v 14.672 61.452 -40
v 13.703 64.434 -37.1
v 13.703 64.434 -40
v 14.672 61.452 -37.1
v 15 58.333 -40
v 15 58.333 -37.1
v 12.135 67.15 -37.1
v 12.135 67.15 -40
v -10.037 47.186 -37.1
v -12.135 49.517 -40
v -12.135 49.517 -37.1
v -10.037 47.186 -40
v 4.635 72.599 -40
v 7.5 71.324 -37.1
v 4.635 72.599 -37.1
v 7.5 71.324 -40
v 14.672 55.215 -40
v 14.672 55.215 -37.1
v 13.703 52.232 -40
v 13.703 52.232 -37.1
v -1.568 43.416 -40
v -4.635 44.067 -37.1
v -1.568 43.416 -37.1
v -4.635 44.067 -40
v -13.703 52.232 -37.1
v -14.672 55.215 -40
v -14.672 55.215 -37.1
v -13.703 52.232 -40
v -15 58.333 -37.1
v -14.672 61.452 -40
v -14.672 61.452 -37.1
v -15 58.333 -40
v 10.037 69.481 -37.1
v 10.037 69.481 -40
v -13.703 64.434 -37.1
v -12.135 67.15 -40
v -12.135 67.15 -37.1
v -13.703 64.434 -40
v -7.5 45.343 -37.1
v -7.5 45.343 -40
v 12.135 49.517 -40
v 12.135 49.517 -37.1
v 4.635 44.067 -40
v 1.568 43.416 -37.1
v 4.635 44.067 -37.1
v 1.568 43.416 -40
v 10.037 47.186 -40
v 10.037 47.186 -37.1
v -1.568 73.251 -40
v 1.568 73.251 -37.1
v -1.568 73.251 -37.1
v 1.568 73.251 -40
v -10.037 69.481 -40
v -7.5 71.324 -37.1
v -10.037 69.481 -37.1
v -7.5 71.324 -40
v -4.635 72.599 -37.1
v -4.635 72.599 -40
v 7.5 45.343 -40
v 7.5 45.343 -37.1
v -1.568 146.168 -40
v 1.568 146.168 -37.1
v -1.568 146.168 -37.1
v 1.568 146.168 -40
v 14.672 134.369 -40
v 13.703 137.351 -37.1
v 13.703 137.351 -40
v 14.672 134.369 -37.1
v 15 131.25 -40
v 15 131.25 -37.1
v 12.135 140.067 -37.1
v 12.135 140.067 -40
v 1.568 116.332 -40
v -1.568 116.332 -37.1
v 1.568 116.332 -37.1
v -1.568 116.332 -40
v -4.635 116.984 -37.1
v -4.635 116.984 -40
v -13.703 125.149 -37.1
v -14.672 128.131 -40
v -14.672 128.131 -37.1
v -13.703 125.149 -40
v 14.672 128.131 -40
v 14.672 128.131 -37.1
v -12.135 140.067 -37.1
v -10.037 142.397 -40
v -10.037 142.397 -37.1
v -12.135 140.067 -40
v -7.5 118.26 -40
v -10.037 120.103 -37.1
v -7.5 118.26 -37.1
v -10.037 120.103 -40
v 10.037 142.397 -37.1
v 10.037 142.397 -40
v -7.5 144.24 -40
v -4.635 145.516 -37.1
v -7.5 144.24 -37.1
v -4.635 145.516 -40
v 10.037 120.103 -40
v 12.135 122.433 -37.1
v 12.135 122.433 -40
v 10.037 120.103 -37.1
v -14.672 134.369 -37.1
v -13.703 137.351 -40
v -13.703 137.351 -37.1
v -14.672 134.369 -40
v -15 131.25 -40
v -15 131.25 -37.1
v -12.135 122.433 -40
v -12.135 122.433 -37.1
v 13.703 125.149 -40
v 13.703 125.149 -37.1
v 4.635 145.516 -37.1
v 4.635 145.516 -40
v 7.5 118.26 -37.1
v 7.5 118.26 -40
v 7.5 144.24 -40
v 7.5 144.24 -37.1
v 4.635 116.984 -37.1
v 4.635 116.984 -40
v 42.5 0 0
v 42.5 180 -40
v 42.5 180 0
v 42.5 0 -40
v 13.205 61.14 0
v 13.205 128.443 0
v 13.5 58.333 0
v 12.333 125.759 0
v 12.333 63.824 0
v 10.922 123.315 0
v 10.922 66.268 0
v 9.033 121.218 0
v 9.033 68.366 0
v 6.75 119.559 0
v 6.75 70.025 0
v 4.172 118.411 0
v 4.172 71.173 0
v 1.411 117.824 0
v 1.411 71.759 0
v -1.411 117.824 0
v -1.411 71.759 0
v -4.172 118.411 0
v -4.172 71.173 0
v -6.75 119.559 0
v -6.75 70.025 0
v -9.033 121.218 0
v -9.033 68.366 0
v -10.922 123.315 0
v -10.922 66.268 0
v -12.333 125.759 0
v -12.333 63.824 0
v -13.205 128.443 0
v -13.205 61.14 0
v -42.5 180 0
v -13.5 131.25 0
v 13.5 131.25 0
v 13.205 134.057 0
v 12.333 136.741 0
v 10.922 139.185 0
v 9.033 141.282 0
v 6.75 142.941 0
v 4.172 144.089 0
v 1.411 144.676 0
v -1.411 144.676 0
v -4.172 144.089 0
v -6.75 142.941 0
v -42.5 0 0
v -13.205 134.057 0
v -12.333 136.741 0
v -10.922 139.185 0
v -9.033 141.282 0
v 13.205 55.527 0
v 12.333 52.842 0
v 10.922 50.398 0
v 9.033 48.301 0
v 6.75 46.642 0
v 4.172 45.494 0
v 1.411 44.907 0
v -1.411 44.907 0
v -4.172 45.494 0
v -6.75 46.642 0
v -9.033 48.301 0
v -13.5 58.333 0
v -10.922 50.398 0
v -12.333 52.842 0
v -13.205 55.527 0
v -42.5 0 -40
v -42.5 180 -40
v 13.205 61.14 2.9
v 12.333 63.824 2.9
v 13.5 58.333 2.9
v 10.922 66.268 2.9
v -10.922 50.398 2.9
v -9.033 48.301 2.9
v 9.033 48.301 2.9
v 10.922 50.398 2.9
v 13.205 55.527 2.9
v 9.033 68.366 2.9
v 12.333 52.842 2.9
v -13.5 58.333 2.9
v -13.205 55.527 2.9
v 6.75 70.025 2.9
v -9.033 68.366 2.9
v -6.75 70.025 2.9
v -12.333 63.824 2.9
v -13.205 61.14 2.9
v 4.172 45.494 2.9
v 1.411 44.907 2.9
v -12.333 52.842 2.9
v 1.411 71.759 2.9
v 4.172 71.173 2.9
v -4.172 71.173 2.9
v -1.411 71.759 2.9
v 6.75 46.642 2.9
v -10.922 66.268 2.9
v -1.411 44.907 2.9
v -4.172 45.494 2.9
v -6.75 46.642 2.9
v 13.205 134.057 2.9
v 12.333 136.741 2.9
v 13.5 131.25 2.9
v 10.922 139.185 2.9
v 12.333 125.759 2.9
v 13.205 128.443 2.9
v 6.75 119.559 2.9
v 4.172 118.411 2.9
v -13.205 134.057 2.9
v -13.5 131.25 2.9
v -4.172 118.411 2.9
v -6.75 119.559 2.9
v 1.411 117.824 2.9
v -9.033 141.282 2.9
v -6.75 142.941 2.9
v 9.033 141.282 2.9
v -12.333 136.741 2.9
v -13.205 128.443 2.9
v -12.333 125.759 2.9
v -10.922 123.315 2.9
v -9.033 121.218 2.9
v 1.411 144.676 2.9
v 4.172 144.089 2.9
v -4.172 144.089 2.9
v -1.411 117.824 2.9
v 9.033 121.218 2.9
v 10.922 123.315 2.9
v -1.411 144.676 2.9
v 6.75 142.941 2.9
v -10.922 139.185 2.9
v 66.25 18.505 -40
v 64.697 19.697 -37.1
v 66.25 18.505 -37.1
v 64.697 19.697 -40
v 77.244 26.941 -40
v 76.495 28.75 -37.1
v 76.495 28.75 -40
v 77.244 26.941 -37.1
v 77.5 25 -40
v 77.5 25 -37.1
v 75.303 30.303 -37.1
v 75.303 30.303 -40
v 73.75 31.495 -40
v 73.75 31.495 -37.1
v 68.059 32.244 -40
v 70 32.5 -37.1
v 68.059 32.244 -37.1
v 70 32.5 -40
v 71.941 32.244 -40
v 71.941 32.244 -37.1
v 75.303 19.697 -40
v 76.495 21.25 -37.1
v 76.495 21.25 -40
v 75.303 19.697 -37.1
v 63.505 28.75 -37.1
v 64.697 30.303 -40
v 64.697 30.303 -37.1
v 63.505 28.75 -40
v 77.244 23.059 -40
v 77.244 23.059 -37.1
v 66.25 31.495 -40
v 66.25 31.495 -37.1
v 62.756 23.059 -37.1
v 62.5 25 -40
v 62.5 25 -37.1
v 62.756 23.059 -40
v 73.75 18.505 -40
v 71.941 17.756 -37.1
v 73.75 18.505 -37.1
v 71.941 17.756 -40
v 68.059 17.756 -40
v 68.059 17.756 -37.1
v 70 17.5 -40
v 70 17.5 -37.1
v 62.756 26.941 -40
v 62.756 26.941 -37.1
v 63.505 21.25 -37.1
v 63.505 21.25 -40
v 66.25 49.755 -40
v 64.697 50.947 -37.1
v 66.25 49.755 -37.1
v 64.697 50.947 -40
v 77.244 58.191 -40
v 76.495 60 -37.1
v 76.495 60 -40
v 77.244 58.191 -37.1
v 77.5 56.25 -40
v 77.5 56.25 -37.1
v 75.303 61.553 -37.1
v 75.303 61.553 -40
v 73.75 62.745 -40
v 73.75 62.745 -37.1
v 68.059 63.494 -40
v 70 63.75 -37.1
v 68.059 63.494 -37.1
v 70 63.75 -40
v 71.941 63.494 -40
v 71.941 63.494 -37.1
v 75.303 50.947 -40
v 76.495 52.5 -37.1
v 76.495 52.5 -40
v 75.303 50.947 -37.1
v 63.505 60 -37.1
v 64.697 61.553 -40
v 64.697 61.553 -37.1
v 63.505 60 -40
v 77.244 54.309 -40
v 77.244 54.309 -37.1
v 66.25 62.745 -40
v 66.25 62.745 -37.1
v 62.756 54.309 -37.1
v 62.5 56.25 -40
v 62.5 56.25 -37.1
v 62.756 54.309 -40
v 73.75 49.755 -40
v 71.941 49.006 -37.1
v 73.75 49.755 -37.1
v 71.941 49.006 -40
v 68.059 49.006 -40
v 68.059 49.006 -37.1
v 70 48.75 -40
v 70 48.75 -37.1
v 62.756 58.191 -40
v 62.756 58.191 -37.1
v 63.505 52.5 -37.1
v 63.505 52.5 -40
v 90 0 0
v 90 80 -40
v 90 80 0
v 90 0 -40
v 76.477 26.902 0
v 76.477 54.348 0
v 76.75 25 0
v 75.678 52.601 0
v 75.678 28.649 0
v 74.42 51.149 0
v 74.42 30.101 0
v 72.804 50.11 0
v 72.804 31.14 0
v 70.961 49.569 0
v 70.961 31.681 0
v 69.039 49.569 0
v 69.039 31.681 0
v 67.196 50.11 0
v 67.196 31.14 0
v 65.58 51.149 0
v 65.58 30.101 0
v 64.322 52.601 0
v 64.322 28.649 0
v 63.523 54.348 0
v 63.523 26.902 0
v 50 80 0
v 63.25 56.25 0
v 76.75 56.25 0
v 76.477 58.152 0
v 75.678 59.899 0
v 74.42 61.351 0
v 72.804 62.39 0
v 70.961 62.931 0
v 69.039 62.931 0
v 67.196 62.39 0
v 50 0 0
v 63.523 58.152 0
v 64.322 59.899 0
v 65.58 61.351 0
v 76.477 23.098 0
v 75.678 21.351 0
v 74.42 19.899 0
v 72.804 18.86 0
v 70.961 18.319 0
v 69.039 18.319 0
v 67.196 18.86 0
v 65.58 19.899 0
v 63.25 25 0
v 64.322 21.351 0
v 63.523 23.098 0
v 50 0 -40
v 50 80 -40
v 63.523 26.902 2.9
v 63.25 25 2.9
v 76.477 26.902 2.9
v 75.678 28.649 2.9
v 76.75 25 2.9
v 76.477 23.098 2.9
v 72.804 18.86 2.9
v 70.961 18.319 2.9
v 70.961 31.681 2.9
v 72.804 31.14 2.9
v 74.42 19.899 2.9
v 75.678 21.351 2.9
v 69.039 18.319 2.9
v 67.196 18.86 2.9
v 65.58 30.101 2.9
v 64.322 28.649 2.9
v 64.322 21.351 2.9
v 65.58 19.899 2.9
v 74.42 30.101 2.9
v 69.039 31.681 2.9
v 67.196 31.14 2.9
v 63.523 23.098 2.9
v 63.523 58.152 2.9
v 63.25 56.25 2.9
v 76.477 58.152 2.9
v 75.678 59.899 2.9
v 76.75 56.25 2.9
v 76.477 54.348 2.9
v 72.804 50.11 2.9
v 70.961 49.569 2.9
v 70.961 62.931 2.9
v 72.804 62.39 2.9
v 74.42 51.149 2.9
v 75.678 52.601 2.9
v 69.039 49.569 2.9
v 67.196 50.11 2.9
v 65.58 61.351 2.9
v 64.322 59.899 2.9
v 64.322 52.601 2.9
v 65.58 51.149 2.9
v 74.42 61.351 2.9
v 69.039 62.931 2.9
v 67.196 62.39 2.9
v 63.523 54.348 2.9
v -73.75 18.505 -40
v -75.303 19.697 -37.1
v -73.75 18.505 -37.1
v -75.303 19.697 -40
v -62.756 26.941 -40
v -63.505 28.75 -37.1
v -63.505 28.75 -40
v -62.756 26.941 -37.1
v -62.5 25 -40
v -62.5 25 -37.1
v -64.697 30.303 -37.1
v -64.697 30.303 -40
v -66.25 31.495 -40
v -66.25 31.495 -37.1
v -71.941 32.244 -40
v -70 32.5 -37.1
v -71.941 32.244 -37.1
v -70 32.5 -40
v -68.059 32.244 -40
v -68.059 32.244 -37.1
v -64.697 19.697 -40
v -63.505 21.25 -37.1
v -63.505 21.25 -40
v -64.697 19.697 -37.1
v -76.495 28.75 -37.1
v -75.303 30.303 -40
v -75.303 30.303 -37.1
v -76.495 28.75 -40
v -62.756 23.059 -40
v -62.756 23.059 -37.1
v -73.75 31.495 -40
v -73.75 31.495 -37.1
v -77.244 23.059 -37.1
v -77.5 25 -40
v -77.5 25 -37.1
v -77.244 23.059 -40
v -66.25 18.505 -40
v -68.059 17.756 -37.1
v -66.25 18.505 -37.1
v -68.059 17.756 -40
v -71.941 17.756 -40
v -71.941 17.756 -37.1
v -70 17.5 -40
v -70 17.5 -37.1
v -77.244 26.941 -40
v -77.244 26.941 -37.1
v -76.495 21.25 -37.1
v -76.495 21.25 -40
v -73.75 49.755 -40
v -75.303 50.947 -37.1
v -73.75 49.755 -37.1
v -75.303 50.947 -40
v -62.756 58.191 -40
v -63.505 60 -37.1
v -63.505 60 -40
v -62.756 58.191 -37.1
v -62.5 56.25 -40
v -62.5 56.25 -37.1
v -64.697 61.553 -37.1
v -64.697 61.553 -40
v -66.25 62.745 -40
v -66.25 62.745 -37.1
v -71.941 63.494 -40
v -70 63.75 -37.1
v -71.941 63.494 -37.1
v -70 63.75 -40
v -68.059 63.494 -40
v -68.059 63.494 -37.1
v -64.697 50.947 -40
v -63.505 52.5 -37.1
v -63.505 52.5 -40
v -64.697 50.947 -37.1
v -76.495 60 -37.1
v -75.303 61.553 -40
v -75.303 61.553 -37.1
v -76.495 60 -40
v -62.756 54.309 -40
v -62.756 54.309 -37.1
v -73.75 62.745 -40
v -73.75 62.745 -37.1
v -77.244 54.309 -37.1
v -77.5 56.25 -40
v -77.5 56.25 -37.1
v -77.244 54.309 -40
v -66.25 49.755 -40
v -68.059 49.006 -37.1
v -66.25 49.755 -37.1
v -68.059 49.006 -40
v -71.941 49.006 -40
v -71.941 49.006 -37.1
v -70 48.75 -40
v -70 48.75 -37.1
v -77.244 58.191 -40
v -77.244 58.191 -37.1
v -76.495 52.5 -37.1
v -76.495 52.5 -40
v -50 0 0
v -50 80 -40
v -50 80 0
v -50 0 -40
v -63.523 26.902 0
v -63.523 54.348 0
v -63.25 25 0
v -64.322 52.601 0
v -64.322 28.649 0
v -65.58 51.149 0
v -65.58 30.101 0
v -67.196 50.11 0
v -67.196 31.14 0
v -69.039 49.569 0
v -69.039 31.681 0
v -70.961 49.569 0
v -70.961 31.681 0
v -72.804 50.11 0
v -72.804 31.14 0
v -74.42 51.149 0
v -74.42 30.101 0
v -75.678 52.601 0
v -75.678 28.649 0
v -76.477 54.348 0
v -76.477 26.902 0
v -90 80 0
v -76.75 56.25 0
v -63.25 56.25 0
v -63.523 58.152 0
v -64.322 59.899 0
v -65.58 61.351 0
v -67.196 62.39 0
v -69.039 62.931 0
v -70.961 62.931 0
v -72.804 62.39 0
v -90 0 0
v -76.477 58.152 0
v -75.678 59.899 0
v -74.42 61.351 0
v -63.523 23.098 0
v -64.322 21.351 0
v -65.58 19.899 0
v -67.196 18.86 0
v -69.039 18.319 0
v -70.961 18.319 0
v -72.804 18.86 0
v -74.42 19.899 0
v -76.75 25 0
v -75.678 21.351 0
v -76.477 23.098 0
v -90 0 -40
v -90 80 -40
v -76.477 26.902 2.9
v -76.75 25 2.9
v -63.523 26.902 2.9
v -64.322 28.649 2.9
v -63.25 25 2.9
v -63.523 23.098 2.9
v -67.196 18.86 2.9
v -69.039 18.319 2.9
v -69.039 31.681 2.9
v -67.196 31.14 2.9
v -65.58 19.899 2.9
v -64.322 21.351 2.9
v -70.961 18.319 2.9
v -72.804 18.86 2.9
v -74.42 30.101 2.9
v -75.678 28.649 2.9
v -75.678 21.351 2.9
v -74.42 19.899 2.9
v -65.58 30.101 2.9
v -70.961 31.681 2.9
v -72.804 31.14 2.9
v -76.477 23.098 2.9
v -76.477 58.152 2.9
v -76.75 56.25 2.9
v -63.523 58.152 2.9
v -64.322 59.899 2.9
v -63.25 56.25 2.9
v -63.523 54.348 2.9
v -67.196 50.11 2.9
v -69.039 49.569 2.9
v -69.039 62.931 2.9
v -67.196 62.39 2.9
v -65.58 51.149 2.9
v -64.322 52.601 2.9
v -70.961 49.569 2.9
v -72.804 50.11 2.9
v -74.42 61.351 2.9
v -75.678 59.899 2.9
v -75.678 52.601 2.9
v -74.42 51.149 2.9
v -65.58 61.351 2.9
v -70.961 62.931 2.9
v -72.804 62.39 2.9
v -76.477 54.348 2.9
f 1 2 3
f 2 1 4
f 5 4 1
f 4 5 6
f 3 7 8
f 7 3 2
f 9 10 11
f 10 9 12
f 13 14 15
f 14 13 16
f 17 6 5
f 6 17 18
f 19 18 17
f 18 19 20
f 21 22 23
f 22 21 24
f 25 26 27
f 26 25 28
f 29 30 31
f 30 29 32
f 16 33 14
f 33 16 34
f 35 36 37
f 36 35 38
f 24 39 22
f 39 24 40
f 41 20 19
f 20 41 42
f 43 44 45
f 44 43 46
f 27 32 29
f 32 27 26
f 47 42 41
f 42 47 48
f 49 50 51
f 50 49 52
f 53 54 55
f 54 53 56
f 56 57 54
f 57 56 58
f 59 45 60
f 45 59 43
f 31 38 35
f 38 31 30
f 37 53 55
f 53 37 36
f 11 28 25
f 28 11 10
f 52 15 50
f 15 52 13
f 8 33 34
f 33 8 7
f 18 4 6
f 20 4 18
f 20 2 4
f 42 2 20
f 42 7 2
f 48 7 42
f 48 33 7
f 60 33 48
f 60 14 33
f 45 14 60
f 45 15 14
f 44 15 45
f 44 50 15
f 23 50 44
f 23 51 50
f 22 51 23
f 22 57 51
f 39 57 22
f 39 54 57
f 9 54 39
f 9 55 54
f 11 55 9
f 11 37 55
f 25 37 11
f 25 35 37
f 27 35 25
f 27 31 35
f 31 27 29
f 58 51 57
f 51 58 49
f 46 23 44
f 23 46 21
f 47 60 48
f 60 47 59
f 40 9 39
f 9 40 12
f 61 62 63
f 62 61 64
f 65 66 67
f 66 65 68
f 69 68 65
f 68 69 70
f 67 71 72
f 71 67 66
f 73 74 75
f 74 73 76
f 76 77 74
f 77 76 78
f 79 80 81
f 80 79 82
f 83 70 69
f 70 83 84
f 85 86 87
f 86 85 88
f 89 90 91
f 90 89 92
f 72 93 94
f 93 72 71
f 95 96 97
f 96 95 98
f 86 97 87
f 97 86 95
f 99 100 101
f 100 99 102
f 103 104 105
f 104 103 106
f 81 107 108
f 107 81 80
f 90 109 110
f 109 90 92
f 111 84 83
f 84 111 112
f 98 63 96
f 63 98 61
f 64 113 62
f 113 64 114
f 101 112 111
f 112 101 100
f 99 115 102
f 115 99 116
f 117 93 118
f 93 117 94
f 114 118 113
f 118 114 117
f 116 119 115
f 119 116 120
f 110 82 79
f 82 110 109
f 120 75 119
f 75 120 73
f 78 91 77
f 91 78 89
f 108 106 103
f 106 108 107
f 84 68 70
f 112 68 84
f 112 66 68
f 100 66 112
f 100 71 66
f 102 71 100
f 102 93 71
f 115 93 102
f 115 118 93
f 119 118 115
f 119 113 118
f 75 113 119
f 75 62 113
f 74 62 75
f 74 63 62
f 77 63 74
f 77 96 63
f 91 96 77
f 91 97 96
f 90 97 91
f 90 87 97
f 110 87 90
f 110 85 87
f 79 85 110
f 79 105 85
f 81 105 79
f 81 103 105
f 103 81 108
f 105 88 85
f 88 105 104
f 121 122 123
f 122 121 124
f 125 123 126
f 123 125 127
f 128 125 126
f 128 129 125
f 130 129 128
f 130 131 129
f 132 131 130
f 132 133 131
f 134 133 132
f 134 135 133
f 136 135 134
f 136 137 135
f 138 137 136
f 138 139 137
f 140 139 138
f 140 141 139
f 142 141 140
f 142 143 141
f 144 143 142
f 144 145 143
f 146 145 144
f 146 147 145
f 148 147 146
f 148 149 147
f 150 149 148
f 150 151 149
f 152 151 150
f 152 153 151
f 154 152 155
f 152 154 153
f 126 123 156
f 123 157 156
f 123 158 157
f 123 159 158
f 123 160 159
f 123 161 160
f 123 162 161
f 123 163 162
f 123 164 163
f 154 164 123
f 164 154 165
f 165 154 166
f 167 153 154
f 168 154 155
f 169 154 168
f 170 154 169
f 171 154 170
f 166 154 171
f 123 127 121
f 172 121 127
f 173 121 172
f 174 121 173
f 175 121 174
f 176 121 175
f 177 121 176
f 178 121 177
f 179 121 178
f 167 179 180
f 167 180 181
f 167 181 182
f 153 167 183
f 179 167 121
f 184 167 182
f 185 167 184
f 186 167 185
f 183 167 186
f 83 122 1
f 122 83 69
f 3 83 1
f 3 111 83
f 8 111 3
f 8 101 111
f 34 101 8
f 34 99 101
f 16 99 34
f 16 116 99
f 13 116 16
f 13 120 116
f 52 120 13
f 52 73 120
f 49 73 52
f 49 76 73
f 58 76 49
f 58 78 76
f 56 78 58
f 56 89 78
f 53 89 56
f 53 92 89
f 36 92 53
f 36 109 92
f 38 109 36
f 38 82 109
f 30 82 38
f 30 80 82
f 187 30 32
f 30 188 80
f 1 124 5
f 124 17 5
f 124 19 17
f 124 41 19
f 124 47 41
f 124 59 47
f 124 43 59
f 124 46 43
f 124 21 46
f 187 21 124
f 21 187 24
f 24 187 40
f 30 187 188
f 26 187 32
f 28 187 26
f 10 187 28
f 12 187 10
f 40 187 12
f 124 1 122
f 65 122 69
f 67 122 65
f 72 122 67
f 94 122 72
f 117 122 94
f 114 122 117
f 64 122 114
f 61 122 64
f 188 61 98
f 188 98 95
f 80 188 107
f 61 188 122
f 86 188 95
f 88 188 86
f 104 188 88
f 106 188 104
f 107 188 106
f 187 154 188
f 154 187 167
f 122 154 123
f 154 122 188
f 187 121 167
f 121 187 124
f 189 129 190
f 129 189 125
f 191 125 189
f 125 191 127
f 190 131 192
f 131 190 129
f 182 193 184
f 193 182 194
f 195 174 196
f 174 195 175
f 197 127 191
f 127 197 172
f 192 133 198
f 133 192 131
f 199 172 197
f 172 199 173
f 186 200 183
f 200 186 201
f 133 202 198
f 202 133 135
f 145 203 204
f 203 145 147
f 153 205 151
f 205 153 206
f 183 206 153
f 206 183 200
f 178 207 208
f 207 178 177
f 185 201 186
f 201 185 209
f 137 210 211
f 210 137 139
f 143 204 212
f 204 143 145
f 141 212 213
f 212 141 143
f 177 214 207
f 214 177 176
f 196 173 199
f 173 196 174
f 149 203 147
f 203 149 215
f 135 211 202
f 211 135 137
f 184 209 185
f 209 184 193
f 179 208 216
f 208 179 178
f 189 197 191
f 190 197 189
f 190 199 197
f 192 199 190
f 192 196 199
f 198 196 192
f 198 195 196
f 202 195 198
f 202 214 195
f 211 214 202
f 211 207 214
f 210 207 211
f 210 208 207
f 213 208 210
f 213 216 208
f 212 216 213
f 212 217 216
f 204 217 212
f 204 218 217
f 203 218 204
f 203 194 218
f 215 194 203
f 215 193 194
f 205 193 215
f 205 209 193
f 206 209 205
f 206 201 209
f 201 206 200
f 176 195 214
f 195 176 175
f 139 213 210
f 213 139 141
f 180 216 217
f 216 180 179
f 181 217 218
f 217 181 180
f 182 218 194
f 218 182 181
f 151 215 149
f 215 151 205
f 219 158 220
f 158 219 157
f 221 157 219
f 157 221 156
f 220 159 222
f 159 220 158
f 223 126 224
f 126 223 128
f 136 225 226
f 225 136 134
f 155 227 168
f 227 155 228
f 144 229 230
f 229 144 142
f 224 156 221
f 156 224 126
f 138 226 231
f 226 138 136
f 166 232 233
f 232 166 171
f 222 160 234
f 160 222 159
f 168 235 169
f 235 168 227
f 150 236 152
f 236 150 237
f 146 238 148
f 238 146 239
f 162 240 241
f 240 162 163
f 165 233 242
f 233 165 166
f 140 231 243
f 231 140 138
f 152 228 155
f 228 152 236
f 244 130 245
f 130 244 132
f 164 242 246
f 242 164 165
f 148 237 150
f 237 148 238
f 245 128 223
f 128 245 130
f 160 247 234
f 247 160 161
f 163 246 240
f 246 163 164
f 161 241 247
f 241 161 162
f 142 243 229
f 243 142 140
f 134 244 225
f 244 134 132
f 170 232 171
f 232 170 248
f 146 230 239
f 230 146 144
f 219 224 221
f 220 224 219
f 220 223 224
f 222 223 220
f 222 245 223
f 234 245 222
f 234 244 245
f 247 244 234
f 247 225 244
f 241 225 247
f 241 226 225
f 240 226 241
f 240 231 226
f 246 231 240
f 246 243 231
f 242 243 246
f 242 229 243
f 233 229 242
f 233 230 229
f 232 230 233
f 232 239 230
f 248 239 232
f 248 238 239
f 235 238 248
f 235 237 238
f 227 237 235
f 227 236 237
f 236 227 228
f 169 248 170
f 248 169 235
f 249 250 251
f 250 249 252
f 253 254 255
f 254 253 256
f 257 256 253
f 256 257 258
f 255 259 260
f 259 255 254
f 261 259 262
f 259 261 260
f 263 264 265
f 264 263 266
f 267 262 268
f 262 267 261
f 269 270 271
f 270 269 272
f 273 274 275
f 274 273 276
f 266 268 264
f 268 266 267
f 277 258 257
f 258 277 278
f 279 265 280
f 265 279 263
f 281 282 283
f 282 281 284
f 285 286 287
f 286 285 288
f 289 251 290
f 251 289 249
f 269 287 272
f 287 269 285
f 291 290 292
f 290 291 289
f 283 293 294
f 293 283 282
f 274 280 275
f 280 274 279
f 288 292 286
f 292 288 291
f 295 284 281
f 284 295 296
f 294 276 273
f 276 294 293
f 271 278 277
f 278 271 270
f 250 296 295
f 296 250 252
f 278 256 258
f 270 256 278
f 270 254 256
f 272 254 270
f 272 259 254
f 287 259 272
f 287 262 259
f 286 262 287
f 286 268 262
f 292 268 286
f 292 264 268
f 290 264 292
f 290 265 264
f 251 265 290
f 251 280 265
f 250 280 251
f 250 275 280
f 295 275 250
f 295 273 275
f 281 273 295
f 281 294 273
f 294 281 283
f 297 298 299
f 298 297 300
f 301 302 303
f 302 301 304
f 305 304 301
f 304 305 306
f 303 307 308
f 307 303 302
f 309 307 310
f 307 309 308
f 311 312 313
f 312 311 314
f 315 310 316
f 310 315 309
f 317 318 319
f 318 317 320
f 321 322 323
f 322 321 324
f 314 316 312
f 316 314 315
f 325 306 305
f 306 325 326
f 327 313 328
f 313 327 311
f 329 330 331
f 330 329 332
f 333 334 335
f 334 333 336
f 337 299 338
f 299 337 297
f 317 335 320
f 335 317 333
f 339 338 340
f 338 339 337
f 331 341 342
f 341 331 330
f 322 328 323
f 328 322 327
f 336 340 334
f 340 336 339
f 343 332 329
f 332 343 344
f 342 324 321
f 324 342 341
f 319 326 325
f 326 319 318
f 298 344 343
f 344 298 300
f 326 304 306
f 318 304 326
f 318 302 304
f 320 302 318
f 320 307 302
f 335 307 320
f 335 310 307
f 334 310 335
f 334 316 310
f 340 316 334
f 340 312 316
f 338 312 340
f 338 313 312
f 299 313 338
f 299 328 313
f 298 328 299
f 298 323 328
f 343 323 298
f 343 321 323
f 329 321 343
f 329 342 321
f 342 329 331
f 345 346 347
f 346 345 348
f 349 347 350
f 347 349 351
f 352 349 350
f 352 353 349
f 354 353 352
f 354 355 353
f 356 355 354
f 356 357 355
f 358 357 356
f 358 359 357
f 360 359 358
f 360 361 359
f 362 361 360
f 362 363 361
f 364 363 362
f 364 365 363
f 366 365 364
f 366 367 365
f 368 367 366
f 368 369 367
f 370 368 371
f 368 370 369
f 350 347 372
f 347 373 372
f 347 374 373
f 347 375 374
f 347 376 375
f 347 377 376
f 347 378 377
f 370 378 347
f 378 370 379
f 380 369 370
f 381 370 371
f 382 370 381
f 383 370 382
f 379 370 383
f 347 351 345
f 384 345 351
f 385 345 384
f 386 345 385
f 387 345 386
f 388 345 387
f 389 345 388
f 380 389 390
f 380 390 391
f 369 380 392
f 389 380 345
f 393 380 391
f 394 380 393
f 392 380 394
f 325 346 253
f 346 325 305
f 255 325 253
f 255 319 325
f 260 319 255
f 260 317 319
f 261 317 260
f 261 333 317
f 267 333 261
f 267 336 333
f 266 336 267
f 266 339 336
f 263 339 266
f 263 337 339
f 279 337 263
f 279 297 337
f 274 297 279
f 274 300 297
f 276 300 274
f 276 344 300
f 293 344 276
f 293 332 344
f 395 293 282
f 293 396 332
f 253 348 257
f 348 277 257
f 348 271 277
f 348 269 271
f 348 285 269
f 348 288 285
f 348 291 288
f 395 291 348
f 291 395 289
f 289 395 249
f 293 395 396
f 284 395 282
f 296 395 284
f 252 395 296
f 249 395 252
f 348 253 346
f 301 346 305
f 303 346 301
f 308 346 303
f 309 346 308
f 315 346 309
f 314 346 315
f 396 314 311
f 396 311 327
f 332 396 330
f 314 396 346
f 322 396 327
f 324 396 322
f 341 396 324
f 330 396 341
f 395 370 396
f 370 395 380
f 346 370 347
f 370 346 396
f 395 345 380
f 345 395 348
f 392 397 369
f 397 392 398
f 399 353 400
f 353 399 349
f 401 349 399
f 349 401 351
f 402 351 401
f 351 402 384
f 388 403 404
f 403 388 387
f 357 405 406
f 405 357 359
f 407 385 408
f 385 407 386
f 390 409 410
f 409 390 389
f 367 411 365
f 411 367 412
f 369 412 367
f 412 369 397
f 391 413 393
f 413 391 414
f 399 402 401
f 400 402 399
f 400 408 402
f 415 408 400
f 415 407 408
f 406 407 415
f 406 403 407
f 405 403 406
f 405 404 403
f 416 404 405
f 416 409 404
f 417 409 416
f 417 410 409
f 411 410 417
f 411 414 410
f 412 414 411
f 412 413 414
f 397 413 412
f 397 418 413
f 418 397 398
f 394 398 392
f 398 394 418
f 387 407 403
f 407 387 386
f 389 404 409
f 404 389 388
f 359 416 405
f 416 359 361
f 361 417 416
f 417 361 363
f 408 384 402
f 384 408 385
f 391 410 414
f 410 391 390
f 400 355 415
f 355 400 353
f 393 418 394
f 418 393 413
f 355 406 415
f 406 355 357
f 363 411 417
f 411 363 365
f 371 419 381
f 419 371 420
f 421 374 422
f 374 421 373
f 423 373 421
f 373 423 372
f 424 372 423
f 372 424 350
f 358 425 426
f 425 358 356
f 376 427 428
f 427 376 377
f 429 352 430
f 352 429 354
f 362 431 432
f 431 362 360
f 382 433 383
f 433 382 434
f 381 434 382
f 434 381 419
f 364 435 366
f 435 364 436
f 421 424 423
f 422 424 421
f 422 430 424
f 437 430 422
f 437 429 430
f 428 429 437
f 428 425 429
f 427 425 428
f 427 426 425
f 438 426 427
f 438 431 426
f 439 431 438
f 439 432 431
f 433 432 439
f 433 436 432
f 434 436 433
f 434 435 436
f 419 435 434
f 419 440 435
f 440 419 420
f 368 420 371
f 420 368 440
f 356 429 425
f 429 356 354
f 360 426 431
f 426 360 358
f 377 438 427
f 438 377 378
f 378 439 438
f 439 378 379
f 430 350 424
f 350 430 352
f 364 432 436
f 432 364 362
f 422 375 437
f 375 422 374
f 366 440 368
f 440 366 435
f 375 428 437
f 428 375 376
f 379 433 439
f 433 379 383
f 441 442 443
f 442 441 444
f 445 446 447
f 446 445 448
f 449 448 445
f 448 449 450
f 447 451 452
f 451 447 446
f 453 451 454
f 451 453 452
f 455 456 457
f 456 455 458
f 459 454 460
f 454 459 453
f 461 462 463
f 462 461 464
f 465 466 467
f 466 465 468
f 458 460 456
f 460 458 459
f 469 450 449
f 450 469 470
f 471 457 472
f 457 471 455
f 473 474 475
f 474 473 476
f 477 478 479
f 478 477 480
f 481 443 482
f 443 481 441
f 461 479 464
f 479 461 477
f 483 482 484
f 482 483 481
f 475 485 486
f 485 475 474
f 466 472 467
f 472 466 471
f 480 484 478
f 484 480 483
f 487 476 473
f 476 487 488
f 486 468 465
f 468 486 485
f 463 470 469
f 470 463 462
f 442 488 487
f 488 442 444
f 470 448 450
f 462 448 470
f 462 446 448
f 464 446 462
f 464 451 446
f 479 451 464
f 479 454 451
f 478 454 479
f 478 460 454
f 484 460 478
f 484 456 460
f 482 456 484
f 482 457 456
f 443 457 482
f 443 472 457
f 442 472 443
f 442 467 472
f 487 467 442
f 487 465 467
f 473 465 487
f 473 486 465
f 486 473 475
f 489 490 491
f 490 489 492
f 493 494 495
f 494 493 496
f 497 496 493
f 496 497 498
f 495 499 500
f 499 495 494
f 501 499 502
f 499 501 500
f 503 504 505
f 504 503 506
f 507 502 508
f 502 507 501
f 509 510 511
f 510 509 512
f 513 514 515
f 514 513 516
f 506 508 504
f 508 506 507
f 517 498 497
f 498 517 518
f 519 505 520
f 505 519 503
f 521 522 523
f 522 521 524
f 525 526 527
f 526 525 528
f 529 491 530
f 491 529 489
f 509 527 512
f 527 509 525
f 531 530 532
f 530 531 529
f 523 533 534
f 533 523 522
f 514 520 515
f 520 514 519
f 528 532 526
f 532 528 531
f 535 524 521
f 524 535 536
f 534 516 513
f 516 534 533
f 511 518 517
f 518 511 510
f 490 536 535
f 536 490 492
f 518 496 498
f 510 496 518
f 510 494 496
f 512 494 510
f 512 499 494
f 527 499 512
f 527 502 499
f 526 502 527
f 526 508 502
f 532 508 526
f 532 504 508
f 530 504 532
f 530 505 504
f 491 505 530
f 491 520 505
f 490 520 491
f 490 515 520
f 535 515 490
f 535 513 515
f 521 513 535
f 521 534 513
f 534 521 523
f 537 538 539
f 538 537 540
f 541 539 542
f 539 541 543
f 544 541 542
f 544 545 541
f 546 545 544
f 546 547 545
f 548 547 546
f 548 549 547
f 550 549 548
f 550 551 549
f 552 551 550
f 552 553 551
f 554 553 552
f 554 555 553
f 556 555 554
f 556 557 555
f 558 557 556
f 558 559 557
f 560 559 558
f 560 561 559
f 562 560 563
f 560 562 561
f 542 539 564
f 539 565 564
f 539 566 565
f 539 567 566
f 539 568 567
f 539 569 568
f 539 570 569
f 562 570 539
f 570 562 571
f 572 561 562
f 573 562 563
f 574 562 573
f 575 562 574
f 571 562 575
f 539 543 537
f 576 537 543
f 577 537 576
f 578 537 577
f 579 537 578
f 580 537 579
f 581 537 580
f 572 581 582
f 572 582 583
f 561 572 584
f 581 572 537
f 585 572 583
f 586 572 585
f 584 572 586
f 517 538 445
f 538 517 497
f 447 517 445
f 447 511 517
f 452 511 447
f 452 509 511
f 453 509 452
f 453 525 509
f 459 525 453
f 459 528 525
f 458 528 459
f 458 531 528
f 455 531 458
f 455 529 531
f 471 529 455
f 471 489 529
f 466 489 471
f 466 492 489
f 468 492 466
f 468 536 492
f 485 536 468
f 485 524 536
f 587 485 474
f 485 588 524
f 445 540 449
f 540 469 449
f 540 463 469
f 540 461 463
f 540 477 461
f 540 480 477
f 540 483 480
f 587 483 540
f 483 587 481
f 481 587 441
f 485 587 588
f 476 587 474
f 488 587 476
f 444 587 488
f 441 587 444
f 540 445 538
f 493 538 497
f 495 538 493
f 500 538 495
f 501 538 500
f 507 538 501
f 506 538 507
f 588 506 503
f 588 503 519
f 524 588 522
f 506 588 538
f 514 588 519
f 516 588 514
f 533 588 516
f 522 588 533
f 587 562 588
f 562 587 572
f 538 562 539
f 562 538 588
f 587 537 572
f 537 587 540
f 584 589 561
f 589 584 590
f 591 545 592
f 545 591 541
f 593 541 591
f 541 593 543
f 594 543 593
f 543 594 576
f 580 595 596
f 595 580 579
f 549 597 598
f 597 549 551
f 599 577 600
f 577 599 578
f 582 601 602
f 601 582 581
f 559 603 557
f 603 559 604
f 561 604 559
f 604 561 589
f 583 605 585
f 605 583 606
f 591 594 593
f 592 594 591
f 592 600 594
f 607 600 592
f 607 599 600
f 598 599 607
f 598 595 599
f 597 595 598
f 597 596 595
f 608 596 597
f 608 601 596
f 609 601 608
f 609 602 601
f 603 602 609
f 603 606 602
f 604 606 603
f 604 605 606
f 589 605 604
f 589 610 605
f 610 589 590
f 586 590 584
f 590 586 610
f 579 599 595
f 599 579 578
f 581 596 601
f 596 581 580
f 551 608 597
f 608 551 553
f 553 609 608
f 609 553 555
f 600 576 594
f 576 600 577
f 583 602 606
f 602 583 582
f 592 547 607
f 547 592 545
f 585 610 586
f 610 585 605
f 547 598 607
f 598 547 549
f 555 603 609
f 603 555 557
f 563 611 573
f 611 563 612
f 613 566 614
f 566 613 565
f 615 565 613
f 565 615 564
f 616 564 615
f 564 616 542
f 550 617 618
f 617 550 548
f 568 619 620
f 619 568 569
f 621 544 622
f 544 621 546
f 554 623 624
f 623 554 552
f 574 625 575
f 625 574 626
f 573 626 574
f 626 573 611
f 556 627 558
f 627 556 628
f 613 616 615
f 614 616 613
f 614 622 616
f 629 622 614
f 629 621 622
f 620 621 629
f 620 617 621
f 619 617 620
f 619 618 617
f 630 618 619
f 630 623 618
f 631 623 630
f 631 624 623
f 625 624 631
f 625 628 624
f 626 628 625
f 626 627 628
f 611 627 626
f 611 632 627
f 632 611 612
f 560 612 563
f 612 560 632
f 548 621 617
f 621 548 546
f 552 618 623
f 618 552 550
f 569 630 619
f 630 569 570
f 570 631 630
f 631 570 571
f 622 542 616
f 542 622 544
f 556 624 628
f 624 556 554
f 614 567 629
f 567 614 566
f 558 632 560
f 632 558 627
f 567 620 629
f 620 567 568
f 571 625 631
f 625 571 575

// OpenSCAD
module mainboxsocket(thickness=5, height=30, length=175, width=75,pin_dia=30){
    pin_height=5;
        
    //color("Salmon") translate([0,length*1/3,-0.5*pin_height-height+pin_height-0.1]) cylinder(h=pin_height,d=pin_dia,center=true);
    difference(){
        color("Blue", alpha=0.5) translate([0,(length+thickness)/2,-1*height/2]) cube([width+2*thickness,length+thickness,height],center=true);
        union(){
            color("Red") translate([0,length/2,-thickness/2]) cube([width,length,thickness],center=true);
            color("Salmon") translate([0,length*1/3,-0.5*pin_height-height+pin_height-0.1]) cylinder(h=pin_height,d=pin_dia,center=true);
            color("Salmon") translate([0,length*3/4,-0.5*pin_height-height+pin_height-0.1]) cylinder(h=pin_height,d=pin_dia,center=true);
            
            }//uni
        }//diff
    }//module


module mainbox(thickness=5, height=30, length=175, width=75,pin_dia=30){
    pin_height=3;
        
    //color("Salmon") translate([0,length*1/3,-0.5*pin_height-height+pin_height-0.1]) cylinder(h=pin_height,d=pin_dia,center=true);
    color("Navy") translate([0,length*1/3,0.5*pin_height+0*height+0*pin_height-0.1]) cylinder(h=pin_height,d=pin_dia*0.9,center=true);
    color("Navy") translate([0,length*3/4,0.5*pin_height+0*height+0*pin_height-0.1]) cylinder(h=pin_height,d=pin_dia*0.9,center=true);

    difference(){
        color("Blue", alpha=0.5) translate([0,(length+thickness)/2,-1*height/2]) cube([width+2*thickness,length+thickness,height],center=true);
        union(){
            color("Salmon") translate([0,length*1/3,-0.5*pin_height-height+pin_height-0.1]) cylinder(h=pin_height,d=pin_dia,center=true);
            color("Salmon") translate([0,length*3/4,-0.5*pin_height-height+pin_height-0.1]) cylinder(h=pin_height,d=pin_dia,center=true);
            
            }//uni
        }//diff
    }//module
    
    
/*
vyska=20;
mainboxsocket(height=vyska);
translate ([70,0,0]) mainboxsocket(height=vyska, length=75, width=30,pin_dia=15);
translate ([-70,0,0]) mainboxsocket(height=vyska, length=75, width=30, pin_dia=15);
*/

vyska=40;
mainbox(height=vyska);
translate ([70,0,0]) mainbox(height=vyska, length=75, width=30,pin_dia=15);
translate ([-70,0,0]) mainbox(height=vyska, length=75, width=30, pin_dia=15);
    
 
